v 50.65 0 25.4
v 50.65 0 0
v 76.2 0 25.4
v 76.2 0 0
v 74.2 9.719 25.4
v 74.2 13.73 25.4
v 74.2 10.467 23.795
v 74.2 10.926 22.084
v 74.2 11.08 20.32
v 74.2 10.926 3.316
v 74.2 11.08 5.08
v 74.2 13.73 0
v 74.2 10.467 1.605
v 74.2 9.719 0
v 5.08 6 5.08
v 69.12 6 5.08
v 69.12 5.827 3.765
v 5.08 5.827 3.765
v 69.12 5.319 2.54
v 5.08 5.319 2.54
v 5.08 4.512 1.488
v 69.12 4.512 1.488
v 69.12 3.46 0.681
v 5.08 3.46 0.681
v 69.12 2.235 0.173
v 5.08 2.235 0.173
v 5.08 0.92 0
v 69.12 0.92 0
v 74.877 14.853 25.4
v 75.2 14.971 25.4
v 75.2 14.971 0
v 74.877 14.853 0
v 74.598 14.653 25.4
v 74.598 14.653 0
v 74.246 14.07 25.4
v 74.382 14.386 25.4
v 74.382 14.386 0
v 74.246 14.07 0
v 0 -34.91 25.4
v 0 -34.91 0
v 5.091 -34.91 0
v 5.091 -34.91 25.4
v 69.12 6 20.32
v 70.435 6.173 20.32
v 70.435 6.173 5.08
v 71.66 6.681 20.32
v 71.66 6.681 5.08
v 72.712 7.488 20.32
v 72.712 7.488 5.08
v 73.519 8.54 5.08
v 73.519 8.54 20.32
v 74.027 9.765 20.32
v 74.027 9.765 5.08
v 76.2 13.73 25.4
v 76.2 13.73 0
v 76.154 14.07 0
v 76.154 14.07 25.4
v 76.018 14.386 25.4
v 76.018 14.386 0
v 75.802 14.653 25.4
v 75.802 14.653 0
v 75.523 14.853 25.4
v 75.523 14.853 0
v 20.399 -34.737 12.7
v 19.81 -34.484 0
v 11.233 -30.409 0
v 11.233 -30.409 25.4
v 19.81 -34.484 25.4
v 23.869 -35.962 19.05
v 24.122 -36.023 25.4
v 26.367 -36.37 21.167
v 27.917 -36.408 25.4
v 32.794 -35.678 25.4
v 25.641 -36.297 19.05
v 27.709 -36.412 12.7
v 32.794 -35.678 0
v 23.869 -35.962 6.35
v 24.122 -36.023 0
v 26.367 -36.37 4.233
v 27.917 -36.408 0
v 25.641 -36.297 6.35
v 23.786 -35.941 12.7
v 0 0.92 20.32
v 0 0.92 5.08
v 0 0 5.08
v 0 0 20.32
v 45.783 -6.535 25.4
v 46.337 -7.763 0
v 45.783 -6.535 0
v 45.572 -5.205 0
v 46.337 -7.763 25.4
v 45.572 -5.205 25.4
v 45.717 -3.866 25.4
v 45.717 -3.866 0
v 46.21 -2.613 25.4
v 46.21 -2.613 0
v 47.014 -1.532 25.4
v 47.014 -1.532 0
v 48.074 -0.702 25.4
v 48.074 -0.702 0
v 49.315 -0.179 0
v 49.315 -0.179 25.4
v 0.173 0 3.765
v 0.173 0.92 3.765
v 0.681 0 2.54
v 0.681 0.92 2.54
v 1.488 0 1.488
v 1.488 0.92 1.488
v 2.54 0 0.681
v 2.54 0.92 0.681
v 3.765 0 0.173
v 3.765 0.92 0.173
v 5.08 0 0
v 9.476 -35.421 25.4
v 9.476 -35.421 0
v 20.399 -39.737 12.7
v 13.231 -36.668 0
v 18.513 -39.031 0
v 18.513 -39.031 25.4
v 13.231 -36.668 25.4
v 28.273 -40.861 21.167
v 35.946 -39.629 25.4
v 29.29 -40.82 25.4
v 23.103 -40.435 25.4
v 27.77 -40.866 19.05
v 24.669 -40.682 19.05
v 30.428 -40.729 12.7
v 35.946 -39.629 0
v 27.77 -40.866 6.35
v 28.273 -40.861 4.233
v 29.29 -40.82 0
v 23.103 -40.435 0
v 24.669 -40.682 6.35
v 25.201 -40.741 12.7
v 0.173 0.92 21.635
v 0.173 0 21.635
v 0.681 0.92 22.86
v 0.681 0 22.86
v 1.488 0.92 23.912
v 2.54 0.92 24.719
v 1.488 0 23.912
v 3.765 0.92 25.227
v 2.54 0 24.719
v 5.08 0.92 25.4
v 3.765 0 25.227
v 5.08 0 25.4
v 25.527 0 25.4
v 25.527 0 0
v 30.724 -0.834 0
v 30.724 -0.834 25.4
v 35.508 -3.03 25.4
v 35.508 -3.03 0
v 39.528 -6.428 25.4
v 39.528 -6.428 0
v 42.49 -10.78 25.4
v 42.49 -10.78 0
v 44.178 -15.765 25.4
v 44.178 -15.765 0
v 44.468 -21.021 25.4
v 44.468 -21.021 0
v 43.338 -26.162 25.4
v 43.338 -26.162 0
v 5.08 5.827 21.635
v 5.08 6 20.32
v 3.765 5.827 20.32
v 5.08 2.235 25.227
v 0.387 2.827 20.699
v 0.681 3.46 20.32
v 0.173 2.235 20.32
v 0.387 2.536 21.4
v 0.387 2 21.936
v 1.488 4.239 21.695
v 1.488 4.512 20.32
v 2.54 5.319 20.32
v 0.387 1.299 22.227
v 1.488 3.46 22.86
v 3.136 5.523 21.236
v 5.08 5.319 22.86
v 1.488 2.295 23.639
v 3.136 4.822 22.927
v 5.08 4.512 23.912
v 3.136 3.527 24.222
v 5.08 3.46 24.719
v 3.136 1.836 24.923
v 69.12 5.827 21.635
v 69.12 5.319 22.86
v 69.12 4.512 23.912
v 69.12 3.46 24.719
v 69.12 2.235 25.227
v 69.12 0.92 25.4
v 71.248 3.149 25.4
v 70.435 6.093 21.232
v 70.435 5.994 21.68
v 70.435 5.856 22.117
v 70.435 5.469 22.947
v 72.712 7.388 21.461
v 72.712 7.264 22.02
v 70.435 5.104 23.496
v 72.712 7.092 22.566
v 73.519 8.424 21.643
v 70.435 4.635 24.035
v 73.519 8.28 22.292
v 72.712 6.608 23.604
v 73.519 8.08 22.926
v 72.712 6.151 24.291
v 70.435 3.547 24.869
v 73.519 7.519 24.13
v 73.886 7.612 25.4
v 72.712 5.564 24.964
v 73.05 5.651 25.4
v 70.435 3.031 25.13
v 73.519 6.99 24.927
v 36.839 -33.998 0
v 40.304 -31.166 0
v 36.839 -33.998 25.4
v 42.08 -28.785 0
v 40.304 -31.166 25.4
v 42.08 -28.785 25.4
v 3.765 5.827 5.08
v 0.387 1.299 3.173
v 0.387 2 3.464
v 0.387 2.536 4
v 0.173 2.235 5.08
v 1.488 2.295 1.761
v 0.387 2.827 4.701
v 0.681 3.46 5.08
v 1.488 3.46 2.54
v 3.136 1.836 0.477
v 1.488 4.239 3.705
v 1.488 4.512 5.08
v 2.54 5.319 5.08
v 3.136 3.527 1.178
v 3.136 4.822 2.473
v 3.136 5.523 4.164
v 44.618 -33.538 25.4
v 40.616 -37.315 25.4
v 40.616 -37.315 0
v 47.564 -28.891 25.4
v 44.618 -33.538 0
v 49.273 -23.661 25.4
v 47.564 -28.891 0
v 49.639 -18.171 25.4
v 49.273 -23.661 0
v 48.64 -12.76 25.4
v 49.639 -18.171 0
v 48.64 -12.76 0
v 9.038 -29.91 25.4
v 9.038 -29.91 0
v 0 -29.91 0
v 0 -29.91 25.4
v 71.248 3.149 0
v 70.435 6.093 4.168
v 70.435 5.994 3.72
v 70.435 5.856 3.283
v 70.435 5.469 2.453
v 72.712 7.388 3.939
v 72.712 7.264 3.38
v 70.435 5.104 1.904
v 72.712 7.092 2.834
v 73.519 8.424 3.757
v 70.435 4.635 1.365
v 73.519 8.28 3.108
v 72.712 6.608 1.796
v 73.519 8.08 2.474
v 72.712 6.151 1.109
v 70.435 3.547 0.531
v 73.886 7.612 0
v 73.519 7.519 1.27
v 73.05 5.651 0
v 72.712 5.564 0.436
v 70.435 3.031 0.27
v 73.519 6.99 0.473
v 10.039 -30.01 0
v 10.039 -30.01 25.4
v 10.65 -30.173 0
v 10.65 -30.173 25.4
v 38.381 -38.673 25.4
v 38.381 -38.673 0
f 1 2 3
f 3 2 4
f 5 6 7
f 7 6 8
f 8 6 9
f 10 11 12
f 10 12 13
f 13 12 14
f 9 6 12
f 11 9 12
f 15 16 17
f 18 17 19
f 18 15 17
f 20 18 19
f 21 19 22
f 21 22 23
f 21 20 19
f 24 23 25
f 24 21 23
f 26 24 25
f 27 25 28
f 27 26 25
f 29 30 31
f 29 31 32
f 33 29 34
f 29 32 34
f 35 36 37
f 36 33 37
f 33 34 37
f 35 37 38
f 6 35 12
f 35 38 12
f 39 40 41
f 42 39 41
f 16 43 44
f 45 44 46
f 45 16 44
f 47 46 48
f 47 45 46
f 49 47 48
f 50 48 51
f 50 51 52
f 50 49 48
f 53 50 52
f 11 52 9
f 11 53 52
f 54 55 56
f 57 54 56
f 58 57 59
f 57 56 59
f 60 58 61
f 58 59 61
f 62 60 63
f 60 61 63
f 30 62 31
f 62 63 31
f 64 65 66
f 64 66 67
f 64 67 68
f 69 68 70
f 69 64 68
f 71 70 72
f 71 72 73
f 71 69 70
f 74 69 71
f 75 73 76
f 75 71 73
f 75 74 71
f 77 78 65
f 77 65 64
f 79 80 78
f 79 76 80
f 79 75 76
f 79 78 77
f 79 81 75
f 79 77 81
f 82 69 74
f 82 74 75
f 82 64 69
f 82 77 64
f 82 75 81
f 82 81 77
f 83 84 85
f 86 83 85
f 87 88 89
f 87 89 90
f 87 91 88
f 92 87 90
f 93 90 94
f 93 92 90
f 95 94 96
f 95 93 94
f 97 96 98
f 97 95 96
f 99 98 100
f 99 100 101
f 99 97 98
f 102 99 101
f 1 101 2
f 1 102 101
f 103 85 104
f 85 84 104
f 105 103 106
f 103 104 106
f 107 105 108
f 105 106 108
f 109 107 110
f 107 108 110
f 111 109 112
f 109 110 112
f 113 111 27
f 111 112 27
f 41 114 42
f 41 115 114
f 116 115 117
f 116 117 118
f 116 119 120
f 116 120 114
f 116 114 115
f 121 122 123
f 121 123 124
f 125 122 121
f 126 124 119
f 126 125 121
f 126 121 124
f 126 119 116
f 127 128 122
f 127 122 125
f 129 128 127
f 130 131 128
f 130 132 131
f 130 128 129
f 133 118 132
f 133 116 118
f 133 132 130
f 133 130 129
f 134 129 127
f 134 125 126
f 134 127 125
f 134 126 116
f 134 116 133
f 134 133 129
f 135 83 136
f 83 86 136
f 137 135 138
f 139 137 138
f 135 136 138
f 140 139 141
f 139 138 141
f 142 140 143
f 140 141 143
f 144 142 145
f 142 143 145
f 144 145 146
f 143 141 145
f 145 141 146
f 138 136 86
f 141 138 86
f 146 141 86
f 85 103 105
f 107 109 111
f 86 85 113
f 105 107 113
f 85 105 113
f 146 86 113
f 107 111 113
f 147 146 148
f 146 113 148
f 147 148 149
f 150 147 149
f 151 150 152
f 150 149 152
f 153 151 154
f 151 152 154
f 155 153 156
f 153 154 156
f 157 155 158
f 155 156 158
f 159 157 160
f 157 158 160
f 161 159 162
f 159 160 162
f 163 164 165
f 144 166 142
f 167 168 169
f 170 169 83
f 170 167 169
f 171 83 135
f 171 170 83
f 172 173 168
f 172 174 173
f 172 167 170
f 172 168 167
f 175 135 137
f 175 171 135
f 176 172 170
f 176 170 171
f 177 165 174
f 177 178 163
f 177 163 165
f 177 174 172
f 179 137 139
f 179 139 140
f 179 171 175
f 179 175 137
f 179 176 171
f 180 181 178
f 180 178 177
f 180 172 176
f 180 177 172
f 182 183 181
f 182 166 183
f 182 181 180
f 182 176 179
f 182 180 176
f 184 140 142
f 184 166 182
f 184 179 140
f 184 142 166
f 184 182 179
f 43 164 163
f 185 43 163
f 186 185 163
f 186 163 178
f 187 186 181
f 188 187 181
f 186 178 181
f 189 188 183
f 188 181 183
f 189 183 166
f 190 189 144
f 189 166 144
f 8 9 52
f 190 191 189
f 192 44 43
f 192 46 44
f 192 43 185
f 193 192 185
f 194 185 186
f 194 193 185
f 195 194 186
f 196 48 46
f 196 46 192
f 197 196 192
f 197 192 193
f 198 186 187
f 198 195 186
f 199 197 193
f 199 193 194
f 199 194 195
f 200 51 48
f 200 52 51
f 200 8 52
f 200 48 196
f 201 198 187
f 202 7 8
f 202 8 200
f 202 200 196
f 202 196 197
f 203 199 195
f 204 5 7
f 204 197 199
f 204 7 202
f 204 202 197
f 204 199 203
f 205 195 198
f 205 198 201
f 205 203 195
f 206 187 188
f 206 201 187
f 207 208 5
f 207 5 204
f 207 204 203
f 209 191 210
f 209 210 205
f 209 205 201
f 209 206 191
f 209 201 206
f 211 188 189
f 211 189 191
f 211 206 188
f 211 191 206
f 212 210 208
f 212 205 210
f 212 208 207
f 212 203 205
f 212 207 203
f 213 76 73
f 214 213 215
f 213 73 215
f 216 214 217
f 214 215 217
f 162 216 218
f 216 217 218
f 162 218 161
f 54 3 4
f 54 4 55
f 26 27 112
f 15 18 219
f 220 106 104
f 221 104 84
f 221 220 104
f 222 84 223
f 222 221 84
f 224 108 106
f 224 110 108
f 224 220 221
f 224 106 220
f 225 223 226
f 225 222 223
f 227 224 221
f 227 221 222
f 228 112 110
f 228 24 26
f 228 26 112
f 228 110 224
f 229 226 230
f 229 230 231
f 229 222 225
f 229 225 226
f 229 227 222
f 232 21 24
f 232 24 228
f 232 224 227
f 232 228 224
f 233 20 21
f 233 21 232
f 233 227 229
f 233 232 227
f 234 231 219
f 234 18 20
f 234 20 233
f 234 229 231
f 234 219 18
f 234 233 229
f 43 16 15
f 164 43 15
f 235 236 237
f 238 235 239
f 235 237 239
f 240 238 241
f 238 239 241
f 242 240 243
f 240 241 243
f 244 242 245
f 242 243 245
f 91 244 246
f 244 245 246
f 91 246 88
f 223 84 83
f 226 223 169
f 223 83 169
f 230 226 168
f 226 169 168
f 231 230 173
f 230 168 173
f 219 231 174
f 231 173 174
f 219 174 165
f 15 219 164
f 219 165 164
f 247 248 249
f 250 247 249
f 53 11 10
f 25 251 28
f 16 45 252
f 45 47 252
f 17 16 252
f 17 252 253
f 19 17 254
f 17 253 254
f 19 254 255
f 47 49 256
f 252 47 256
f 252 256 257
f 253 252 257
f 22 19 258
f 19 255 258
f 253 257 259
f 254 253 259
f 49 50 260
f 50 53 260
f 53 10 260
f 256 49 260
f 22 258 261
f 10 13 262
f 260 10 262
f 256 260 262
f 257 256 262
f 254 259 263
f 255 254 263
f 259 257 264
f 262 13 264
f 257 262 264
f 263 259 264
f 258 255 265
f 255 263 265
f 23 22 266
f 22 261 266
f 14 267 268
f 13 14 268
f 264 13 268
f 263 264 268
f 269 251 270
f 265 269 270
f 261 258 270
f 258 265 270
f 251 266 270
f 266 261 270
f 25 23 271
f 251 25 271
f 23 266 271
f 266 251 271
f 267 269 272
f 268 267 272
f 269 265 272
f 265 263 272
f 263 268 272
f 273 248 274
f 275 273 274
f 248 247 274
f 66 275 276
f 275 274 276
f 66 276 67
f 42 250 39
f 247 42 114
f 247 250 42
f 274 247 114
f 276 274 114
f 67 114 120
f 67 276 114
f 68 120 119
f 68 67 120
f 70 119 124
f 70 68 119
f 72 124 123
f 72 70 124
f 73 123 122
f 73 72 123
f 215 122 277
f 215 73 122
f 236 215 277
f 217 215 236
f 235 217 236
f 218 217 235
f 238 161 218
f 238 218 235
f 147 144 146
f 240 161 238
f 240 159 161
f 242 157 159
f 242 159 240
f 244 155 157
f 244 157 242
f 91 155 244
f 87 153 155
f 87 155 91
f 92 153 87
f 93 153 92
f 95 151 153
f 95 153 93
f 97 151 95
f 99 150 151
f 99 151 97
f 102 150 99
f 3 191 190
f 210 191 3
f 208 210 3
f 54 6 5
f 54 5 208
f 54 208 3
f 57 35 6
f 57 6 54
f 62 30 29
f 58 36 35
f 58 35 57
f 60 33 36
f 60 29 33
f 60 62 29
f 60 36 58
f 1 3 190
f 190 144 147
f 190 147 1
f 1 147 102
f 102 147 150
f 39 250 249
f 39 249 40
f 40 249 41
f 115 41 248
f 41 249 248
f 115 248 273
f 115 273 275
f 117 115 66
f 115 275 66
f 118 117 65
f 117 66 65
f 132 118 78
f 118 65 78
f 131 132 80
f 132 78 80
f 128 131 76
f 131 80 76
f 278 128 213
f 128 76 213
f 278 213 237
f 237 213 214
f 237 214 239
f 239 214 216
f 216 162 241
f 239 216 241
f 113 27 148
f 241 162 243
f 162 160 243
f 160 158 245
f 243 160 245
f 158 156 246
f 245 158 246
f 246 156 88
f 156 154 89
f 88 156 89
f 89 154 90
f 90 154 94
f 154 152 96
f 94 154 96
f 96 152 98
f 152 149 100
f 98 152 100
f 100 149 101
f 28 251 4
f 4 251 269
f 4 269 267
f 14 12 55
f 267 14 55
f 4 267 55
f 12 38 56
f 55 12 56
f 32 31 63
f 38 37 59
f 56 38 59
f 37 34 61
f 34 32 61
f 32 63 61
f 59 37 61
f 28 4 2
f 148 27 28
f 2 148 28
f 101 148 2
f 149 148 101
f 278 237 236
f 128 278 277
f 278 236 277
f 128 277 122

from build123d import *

# Parameters (mm, degrees)
F1_DEPTH     = 25.4
F2_R         = 5.08
F3_T1_DEPTH  = 15.24
F3_T6_ANGLE  = 233.2969892374
F3_T12_ANGLE = 233.2969892374
F4_T1_DEPTH  = 31.75
F5_R         = 15.24
F6_R         = 5.08
F7_R         = 5.08
F8_R         = 5.08


# Not quite as in the source:
# - a fillet or chamfer that OpenCascade refuses, or shapes differently, is made with other operations: its cross-section is extruded or revolved along the edge and cut away or added


with BuildPart() as f1:
    # F0 (on Top) → F1 (new body)
    with BuildSketch(Plane.XY):
        Polygon((0, 6), (0, 0), (25.5269114748, 0), (38.1, 0), (76.2, 0), (76.2, 15), (74.2, 15), (74.2, 6), align=None)
        with BuildLine():
            Line((38.1, 0), (25.5269114748, 0))
            ThreePointArc((25.5269114748, 0), (43.3170296074, -12.6890998813), (38.1, -33.909))
            add(Edge.make_bspline(
                [(10.1822623983, -29.9098208), (13.5454405981, -31.48996992), (21.4109886211, -35.5910719416), (28.6130215973, -37.6913323998), (38.1, -33.909)],
                knots=[0, 0, 0, 0, 0.4439990675, 1, 1, 1, 1], degree=3))
            Line((10.1822623983, -29.9098208), (0, -29.9098208))
            Line((0, -29.9098208), (0, -34.9098208))
            Line((0, -34.9098208), (5.0913545239, -34.9098208))
            add(Edge.make_bspline(
                [(38.1, -38.909), (31.7124112149, -41.2898788749), (19.626955474, -41.5346198852), (11.6216761715, -34.9098208), (5.0913545239, -34.9098208)],
                knots=[0, 0, 0, 0, 0.512363552, 1, 1, 1, 1], degree=3))
            ThreePointArc((38.1, -38.909), (49.6761075901, -19.4545), (38.1, 0))
        make_face()
    extrude(amount=F1_DEPTH)

    # F2
    f2_edges = [f1.edges().sort_by_distance(p)[0] for p in [
        (37.1, 6, 25.4),
        (37.1, 6, 0),
    ]]
    fillet(f2_edges, radius=F2_R)

    # F3: fillet of radius 5.08 on 1 edges, made by hand

    # F3_s2 → F3_t1 (join)
    with BuildSketch(Plane.XY.offset(5.08)):
        with BuildLine():
            ThreePointArc((69.12, 6), (72.7121024484, 7.4878975516), (74.2, 11.08))
            Line((74.2, 11.08), (74.2, 6))
            Line((74.2, 6), (69.12, 6))
        make_face()
    extrude(amount=F3_T1_DEPTH)


with BuildPart() as f3_tool4:
    # F3_s5 → F3_t6 (revolve)
    with BuildSketch(Plane.XY.offset(5.08)):
        with BuildLine():
            ThreePointArc((69.12, 6), (72.7121024484, 7.4878975516), (74.2, 11.08))
            Line((74.2, 11.08), (74.2, 6))
            Line((74.2, 6), (69.12, 6))
        make_face()
    revolve(axis=Axis((74.2, 0.92, 5.08), (-1, 0, 0)), revolution_arc=F3_T6_ANGLE)

    split(bisect_by=Plane.XY, keep=Keep.TOP)

    split(bisect_by=Plane.XZ, keep=Keep.BOTTOM)


with BuildPart() as f1_1:
    add(f1.part)

    # F3_t3: union F3_tool4
    add(f3_tool4.part)


with BuildPart() as f3_tool10:
    # F3_s11 → F3_t12 (revolve)
    with BuildSketch(Plane.XY.offset(20.32)):
        with BuildLine():
            ThreePointArc((69.12, 6), (72.7121024484, 7.4878975516), (74.2, 11.08))
            Line((74.2, 11.08), (74.2, 6))
            Line((74.2, 6), (69.12, 6))
        make_face()
    revolve(axis=Axis((74.2, 0.92, 20.32), (1, 0, 0)), revolution_arc=F3_T12_ANGLE)

    split(bisect_by=Plane.XY.offset(25.4), keep=Keep.BOTTOM)

    split(bisect_by=Plane.XZ, keep=Keep.BOTTOM)


with BuildPart() as f1_2:
    add(f1_1.part)

    # F3_t9: union F3_tool10
    add(f3_tool10.part)

    # F4: fillet of radius 1.27 on 2 edges, made by hand

    # F4_s2 → F4_t1 (cut)
    with BuildSketch(Plane.XY.offset(-3.175)):
        with BuildLine():
            ThreePointArc((75.47, 15), (74.5719743879, 14.6280256121), (74.2, 13.73))
            Line((74.2, 13.73), (74.2, 15))
            Line((74.2, 15), (75.47, 15))
        make_face()
        with BuildLine():
            ThreePointArc((76.2, 13.73), (75.8280256121, 14.6280256121), (74.93, 15))
            Line((74.93, 15), (76.2, 15))
            Line((76.2, 15), (76.2, 13.73))
        make_face()
    extrude(amount=F4_T1_DEPTH, mode=Mode.SUBTRACT)

    # F5
    f5_edges = [f1_2.edges().sort_by_distance(p)[0] for p in [
        (38.1, -38.909, 12.7),
        (38.1, -33.909, 12.7),
    ]]
    fillet(f5_edges, radius=F5_R)

    # F6
    f6_edges = [f1_2.edges().sort_by_distance(p)[0] for p in [
        (38.1, 0, 12.7),
    ]]
    fillet(f6_edges, radius=F6_R)

    # F7
    f7_edges = [f1_2.edges().sort_by_distance(p)[0] for p in [
        (10.182262, -29.909821, 12.7),
    ]]
    fillet(f7_edges, radius=F7_R)

    # F8
    f8_edges = [f1_2.edges().sort_by_distance(p)[0] for p in [
        (0, 6, 12.7),
        (0, 0.46, 0),
        (0, 4.512102, 1.487898),
        (0, 4.512102, 23.912102),
        (0, 0.46, 25.4),
    ]]
    fillet(f8_edges, radius=F8_R)


solid = f1_2.part
